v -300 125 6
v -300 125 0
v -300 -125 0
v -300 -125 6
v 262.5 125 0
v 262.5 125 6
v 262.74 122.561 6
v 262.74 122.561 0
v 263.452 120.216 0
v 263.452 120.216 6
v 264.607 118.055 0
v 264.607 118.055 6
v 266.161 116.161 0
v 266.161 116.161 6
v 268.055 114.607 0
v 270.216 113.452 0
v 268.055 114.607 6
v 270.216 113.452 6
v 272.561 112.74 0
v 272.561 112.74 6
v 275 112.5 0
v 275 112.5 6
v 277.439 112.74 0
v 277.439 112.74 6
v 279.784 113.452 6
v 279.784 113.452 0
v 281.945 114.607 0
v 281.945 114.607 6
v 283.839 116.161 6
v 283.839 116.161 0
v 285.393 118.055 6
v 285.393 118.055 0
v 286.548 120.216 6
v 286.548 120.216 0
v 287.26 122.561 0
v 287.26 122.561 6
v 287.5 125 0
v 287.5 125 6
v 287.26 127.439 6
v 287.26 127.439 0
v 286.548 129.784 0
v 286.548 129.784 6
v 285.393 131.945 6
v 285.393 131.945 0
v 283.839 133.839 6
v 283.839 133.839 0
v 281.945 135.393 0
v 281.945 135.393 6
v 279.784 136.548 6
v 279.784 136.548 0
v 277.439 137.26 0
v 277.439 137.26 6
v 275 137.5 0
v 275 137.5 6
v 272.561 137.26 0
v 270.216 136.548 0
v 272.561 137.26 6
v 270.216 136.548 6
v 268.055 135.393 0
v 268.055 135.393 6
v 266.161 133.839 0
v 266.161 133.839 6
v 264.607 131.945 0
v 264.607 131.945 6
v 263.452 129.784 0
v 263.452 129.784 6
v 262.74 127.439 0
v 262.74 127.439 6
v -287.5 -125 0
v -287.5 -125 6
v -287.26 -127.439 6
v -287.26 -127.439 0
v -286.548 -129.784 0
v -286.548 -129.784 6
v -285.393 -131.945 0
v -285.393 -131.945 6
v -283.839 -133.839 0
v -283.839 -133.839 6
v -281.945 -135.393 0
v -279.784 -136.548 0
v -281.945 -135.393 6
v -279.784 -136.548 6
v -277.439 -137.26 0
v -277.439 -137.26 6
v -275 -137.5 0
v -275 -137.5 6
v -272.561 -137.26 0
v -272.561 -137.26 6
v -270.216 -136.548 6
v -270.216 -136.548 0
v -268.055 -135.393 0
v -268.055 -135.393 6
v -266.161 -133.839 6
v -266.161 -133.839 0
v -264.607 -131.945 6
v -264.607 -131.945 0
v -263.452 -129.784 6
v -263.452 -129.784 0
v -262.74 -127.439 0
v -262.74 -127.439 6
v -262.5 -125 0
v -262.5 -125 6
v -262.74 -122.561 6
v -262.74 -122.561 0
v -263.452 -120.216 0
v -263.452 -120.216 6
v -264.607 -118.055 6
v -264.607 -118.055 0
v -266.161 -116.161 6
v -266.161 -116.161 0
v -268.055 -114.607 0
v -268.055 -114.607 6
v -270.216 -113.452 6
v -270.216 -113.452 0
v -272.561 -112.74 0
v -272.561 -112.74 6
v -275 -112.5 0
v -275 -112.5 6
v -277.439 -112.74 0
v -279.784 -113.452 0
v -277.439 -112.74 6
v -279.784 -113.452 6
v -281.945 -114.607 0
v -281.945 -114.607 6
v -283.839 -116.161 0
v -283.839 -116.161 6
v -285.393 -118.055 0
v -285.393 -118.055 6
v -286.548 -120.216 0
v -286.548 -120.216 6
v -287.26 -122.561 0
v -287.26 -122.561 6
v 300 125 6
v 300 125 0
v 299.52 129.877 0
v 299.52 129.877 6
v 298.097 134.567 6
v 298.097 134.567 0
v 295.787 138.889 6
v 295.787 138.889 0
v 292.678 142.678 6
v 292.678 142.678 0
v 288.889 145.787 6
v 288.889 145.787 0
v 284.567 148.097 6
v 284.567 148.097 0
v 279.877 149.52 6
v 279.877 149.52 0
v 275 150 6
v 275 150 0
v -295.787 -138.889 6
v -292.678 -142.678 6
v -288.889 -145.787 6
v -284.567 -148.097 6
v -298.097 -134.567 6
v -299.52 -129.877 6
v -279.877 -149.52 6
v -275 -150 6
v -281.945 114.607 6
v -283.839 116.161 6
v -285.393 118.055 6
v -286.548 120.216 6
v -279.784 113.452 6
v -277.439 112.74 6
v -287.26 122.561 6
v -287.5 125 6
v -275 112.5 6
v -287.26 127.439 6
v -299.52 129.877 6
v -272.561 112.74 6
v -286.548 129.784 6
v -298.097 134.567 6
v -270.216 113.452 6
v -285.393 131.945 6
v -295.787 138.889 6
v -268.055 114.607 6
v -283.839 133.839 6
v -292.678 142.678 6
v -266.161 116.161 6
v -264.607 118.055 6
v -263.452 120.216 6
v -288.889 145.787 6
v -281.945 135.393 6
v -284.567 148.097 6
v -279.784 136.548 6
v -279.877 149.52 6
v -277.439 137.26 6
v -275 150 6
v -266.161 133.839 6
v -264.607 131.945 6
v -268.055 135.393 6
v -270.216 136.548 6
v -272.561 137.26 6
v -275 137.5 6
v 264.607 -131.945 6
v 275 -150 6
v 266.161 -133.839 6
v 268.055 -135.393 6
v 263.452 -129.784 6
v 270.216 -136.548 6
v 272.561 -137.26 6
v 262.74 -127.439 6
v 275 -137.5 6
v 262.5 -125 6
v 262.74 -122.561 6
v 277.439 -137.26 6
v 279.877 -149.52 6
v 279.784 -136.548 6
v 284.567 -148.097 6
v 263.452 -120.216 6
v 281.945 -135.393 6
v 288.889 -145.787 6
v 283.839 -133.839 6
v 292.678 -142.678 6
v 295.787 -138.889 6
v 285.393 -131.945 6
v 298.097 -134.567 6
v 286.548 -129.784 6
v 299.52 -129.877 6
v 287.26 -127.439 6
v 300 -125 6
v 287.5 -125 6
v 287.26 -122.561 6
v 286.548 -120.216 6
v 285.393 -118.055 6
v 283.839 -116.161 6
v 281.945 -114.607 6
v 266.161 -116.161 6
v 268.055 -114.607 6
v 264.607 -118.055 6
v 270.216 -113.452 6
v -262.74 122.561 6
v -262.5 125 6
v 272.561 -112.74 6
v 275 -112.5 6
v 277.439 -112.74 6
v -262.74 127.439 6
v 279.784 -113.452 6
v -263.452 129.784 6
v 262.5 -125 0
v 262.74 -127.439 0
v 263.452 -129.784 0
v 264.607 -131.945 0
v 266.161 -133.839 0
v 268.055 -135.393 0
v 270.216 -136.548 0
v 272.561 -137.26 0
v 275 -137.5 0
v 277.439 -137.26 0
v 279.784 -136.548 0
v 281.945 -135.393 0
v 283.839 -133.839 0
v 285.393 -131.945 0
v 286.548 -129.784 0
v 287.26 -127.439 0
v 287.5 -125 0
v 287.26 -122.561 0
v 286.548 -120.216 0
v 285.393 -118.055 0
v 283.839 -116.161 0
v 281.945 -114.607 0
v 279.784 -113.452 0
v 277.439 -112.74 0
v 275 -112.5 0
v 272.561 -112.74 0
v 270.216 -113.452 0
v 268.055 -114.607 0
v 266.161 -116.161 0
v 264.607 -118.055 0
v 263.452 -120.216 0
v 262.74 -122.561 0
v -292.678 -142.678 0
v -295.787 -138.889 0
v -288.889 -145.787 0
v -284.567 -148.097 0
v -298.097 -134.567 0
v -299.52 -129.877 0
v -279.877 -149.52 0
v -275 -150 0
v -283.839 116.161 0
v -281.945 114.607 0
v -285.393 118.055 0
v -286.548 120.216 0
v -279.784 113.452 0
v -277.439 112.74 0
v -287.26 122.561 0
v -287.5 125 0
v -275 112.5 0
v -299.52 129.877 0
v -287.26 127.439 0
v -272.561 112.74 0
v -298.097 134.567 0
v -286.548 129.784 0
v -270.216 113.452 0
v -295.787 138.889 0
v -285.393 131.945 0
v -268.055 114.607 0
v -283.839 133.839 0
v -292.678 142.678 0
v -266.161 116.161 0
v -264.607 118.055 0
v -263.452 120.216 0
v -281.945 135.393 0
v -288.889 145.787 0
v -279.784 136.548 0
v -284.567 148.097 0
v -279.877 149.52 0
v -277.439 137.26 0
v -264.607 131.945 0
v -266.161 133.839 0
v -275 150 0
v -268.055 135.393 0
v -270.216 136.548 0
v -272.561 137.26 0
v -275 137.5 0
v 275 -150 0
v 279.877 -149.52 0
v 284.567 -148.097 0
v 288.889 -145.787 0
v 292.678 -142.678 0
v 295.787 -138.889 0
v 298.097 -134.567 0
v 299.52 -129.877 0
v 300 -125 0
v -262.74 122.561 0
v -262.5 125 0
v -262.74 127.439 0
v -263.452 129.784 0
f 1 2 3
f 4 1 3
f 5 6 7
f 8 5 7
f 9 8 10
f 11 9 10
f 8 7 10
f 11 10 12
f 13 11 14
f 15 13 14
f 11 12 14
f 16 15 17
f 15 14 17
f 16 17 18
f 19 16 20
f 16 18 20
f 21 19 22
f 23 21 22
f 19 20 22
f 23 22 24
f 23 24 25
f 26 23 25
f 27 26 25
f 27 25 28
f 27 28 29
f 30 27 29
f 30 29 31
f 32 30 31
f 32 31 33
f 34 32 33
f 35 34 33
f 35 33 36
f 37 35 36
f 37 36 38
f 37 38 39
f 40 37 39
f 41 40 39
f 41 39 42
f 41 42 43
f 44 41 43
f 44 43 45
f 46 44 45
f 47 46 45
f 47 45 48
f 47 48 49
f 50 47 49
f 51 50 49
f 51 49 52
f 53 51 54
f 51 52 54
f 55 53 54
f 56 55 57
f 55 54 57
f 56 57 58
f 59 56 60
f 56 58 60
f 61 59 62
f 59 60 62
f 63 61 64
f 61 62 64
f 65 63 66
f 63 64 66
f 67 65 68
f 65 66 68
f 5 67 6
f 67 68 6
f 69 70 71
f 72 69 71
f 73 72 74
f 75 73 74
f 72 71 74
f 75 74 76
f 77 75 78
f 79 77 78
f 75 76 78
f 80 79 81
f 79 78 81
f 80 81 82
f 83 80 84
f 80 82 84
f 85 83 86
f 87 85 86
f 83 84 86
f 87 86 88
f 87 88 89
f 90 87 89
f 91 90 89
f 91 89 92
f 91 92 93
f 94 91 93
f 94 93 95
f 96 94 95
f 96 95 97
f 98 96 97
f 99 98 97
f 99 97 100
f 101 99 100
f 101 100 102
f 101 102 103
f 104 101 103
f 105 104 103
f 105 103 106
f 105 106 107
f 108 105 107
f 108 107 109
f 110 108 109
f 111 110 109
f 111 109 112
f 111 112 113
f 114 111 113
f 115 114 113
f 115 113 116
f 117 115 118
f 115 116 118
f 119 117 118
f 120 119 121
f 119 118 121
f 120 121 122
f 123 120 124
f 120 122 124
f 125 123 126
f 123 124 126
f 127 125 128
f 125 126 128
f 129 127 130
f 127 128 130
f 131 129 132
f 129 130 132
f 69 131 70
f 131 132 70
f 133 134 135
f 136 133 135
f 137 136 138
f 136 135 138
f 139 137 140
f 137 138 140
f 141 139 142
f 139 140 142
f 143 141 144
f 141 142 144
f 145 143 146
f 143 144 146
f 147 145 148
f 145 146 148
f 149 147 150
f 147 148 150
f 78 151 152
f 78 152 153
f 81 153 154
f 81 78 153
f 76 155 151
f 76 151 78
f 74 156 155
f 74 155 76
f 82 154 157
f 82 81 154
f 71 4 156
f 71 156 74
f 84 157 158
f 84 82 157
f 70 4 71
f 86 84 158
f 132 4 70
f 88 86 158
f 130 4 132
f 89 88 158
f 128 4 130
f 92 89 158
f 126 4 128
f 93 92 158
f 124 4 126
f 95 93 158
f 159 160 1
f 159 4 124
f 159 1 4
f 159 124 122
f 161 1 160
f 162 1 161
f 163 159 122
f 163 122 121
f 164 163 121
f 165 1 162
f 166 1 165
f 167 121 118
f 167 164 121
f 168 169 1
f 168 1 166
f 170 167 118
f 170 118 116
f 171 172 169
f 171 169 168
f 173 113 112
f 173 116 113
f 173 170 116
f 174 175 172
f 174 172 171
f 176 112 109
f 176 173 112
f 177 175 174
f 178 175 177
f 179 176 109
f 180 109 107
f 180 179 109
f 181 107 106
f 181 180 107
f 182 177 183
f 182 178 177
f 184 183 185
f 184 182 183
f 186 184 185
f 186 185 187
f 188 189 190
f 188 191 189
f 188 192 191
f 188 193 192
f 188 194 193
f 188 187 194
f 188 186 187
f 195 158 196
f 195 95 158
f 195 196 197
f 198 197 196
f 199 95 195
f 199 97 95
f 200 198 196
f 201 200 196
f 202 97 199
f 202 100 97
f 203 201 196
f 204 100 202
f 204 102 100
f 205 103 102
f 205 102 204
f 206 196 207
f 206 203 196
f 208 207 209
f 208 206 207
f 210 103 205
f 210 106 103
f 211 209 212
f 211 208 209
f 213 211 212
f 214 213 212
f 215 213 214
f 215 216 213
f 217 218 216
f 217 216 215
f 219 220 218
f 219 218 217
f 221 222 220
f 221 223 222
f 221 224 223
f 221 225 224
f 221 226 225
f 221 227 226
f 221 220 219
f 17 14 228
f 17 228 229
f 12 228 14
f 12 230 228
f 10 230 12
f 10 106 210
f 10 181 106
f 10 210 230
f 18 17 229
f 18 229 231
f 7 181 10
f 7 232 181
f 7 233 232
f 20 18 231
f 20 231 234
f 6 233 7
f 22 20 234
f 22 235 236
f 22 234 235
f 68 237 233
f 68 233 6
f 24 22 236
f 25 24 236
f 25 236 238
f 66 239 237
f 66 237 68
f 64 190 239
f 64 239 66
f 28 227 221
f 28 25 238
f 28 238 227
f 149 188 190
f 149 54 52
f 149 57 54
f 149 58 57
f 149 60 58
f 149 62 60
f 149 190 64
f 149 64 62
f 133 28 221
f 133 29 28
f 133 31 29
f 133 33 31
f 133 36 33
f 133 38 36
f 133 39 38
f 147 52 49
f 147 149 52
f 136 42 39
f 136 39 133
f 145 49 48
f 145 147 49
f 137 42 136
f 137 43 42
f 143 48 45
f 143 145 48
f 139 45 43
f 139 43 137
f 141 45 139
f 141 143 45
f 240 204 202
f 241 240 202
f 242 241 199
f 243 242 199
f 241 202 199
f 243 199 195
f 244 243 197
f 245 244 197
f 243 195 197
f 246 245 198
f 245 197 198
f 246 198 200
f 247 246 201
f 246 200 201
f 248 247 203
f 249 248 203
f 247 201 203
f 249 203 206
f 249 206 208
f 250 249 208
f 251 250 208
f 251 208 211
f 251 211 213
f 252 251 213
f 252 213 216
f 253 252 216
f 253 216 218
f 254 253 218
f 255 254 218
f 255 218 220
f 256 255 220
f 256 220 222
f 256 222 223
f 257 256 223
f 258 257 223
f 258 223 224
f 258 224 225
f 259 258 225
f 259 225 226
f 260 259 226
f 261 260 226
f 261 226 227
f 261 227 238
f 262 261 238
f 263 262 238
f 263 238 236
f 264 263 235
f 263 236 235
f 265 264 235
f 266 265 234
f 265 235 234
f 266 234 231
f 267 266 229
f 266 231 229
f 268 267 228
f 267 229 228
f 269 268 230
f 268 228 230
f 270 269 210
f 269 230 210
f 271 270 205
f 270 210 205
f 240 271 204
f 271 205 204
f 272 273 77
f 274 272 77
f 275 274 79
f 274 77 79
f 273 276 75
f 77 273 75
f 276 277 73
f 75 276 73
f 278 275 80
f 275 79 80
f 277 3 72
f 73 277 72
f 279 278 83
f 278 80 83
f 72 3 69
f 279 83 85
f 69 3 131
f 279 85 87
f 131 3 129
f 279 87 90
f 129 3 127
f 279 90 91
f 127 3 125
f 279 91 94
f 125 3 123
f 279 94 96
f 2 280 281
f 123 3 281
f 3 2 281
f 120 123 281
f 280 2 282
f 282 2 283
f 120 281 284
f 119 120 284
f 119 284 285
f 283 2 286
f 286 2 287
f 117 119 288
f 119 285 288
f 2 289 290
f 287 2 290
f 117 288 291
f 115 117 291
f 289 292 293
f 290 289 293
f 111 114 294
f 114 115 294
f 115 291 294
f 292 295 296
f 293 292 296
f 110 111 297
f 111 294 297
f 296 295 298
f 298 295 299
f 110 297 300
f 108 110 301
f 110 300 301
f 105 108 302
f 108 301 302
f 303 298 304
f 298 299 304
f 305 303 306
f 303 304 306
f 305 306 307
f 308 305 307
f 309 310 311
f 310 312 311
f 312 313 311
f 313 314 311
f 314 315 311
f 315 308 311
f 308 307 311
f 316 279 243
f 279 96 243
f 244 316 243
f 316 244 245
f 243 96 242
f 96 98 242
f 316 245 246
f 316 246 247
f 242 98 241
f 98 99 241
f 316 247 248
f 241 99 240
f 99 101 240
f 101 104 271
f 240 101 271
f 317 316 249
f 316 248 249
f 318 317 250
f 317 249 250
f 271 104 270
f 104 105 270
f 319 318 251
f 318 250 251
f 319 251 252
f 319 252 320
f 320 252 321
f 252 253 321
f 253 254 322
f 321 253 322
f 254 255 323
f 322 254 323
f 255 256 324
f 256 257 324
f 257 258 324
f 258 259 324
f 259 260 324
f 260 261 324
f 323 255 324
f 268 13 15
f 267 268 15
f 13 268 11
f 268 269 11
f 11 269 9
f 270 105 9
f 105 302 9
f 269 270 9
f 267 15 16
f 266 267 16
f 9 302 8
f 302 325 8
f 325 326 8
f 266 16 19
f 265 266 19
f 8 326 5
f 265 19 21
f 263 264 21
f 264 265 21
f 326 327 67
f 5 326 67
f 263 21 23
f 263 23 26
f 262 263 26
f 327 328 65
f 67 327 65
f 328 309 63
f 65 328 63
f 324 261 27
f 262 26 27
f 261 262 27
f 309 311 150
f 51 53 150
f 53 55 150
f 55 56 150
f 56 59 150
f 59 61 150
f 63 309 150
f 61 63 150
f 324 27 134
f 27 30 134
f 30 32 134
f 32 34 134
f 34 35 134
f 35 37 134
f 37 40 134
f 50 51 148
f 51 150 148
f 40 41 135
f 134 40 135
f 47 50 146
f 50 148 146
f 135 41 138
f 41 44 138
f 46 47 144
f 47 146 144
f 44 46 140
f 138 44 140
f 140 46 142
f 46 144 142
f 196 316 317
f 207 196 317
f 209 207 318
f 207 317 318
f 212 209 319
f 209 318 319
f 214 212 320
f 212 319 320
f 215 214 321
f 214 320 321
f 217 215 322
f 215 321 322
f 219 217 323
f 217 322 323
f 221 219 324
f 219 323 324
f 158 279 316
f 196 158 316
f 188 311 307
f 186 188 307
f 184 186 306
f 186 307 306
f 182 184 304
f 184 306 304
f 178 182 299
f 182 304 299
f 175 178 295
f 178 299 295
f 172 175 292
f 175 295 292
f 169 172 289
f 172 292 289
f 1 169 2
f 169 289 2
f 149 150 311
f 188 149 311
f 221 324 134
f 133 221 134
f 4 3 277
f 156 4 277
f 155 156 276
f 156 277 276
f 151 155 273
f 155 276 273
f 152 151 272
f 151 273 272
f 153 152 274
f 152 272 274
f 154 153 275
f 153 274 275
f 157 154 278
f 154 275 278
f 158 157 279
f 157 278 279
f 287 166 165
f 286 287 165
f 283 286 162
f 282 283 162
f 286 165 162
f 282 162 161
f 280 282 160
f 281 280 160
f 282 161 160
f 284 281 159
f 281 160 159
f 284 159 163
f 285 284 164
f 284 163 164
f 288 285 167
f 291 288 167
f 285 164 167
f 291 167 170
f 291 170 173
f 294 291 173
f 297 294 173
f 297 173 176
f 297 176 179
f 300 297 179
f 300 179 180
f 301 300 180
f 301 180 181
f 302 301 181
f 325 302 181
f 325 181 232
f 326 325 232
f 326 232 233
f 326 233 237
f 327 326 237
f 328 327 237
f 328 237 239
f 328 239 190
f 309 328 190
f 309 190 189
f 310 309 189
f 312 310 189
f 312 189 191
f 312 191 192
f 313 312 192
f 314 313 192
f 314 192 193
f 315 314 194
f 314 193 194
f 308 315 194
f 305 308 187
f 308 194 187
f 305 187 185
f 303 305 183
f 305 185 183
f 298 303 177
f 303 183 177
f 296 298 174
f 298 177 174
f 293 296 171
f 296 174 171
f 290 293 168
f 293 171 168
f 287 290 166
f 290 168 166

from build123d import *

# Parameters (mm, degrees)
F1_DEPTH = 6
F2_D     = 25
F3_D     = 25
F4_D     = 25


with BuildPart() as f1:
    # F0 (on Top) → F1 (new body)
    with BuildSketch(Plane.XY):
        with BuildLine():
            Line((-275, -150), (275, -150))
            ThreePointArc((275, -150), (292.67767, -142.67767), (300, -125))
            Line((300, -125), (300, 125))
            ThreePointArc((300, 125), (292.67767, 142.67767), (275, 150))
            Line((275, 150), (-275, 150))
            ThreePointArc((-275, 150), (-292.67767, 142.67767), (-300, 125))
            Line((-300, 125), (-300, -125))
            ThreePointArc((-300, -125), (-292.67767, -142.67767), (-275, -150))
        make_face()
    extrude(amount=F1_DEPTH)

    # F2 (through all)
    with Locations(Plane(origin=(0, 0, 0), x_dir=(1, 0, 0), z_dir=(0, 0, -1))):
        with Locations((-275, -125)):
            Hole(F2_D / 2)

    # F3 (through all)
    with Locations(Plane(origin=(0, 0, 0), x_dir=(1, 0, 0), z_dir=(0, 0, -1))):
        with Locations((-275, 125), (275, -125)):
            Hole(F3_D / 2)

    # F4 (through all)
    with Locations(Plane(origin=(0, 0, 0), x_dir=(1, 0, 0), z_dir=(0, 0, -1))):
        with Locations((275, 125)):
            Hole(F4_D / 2)


solid = f1.part
